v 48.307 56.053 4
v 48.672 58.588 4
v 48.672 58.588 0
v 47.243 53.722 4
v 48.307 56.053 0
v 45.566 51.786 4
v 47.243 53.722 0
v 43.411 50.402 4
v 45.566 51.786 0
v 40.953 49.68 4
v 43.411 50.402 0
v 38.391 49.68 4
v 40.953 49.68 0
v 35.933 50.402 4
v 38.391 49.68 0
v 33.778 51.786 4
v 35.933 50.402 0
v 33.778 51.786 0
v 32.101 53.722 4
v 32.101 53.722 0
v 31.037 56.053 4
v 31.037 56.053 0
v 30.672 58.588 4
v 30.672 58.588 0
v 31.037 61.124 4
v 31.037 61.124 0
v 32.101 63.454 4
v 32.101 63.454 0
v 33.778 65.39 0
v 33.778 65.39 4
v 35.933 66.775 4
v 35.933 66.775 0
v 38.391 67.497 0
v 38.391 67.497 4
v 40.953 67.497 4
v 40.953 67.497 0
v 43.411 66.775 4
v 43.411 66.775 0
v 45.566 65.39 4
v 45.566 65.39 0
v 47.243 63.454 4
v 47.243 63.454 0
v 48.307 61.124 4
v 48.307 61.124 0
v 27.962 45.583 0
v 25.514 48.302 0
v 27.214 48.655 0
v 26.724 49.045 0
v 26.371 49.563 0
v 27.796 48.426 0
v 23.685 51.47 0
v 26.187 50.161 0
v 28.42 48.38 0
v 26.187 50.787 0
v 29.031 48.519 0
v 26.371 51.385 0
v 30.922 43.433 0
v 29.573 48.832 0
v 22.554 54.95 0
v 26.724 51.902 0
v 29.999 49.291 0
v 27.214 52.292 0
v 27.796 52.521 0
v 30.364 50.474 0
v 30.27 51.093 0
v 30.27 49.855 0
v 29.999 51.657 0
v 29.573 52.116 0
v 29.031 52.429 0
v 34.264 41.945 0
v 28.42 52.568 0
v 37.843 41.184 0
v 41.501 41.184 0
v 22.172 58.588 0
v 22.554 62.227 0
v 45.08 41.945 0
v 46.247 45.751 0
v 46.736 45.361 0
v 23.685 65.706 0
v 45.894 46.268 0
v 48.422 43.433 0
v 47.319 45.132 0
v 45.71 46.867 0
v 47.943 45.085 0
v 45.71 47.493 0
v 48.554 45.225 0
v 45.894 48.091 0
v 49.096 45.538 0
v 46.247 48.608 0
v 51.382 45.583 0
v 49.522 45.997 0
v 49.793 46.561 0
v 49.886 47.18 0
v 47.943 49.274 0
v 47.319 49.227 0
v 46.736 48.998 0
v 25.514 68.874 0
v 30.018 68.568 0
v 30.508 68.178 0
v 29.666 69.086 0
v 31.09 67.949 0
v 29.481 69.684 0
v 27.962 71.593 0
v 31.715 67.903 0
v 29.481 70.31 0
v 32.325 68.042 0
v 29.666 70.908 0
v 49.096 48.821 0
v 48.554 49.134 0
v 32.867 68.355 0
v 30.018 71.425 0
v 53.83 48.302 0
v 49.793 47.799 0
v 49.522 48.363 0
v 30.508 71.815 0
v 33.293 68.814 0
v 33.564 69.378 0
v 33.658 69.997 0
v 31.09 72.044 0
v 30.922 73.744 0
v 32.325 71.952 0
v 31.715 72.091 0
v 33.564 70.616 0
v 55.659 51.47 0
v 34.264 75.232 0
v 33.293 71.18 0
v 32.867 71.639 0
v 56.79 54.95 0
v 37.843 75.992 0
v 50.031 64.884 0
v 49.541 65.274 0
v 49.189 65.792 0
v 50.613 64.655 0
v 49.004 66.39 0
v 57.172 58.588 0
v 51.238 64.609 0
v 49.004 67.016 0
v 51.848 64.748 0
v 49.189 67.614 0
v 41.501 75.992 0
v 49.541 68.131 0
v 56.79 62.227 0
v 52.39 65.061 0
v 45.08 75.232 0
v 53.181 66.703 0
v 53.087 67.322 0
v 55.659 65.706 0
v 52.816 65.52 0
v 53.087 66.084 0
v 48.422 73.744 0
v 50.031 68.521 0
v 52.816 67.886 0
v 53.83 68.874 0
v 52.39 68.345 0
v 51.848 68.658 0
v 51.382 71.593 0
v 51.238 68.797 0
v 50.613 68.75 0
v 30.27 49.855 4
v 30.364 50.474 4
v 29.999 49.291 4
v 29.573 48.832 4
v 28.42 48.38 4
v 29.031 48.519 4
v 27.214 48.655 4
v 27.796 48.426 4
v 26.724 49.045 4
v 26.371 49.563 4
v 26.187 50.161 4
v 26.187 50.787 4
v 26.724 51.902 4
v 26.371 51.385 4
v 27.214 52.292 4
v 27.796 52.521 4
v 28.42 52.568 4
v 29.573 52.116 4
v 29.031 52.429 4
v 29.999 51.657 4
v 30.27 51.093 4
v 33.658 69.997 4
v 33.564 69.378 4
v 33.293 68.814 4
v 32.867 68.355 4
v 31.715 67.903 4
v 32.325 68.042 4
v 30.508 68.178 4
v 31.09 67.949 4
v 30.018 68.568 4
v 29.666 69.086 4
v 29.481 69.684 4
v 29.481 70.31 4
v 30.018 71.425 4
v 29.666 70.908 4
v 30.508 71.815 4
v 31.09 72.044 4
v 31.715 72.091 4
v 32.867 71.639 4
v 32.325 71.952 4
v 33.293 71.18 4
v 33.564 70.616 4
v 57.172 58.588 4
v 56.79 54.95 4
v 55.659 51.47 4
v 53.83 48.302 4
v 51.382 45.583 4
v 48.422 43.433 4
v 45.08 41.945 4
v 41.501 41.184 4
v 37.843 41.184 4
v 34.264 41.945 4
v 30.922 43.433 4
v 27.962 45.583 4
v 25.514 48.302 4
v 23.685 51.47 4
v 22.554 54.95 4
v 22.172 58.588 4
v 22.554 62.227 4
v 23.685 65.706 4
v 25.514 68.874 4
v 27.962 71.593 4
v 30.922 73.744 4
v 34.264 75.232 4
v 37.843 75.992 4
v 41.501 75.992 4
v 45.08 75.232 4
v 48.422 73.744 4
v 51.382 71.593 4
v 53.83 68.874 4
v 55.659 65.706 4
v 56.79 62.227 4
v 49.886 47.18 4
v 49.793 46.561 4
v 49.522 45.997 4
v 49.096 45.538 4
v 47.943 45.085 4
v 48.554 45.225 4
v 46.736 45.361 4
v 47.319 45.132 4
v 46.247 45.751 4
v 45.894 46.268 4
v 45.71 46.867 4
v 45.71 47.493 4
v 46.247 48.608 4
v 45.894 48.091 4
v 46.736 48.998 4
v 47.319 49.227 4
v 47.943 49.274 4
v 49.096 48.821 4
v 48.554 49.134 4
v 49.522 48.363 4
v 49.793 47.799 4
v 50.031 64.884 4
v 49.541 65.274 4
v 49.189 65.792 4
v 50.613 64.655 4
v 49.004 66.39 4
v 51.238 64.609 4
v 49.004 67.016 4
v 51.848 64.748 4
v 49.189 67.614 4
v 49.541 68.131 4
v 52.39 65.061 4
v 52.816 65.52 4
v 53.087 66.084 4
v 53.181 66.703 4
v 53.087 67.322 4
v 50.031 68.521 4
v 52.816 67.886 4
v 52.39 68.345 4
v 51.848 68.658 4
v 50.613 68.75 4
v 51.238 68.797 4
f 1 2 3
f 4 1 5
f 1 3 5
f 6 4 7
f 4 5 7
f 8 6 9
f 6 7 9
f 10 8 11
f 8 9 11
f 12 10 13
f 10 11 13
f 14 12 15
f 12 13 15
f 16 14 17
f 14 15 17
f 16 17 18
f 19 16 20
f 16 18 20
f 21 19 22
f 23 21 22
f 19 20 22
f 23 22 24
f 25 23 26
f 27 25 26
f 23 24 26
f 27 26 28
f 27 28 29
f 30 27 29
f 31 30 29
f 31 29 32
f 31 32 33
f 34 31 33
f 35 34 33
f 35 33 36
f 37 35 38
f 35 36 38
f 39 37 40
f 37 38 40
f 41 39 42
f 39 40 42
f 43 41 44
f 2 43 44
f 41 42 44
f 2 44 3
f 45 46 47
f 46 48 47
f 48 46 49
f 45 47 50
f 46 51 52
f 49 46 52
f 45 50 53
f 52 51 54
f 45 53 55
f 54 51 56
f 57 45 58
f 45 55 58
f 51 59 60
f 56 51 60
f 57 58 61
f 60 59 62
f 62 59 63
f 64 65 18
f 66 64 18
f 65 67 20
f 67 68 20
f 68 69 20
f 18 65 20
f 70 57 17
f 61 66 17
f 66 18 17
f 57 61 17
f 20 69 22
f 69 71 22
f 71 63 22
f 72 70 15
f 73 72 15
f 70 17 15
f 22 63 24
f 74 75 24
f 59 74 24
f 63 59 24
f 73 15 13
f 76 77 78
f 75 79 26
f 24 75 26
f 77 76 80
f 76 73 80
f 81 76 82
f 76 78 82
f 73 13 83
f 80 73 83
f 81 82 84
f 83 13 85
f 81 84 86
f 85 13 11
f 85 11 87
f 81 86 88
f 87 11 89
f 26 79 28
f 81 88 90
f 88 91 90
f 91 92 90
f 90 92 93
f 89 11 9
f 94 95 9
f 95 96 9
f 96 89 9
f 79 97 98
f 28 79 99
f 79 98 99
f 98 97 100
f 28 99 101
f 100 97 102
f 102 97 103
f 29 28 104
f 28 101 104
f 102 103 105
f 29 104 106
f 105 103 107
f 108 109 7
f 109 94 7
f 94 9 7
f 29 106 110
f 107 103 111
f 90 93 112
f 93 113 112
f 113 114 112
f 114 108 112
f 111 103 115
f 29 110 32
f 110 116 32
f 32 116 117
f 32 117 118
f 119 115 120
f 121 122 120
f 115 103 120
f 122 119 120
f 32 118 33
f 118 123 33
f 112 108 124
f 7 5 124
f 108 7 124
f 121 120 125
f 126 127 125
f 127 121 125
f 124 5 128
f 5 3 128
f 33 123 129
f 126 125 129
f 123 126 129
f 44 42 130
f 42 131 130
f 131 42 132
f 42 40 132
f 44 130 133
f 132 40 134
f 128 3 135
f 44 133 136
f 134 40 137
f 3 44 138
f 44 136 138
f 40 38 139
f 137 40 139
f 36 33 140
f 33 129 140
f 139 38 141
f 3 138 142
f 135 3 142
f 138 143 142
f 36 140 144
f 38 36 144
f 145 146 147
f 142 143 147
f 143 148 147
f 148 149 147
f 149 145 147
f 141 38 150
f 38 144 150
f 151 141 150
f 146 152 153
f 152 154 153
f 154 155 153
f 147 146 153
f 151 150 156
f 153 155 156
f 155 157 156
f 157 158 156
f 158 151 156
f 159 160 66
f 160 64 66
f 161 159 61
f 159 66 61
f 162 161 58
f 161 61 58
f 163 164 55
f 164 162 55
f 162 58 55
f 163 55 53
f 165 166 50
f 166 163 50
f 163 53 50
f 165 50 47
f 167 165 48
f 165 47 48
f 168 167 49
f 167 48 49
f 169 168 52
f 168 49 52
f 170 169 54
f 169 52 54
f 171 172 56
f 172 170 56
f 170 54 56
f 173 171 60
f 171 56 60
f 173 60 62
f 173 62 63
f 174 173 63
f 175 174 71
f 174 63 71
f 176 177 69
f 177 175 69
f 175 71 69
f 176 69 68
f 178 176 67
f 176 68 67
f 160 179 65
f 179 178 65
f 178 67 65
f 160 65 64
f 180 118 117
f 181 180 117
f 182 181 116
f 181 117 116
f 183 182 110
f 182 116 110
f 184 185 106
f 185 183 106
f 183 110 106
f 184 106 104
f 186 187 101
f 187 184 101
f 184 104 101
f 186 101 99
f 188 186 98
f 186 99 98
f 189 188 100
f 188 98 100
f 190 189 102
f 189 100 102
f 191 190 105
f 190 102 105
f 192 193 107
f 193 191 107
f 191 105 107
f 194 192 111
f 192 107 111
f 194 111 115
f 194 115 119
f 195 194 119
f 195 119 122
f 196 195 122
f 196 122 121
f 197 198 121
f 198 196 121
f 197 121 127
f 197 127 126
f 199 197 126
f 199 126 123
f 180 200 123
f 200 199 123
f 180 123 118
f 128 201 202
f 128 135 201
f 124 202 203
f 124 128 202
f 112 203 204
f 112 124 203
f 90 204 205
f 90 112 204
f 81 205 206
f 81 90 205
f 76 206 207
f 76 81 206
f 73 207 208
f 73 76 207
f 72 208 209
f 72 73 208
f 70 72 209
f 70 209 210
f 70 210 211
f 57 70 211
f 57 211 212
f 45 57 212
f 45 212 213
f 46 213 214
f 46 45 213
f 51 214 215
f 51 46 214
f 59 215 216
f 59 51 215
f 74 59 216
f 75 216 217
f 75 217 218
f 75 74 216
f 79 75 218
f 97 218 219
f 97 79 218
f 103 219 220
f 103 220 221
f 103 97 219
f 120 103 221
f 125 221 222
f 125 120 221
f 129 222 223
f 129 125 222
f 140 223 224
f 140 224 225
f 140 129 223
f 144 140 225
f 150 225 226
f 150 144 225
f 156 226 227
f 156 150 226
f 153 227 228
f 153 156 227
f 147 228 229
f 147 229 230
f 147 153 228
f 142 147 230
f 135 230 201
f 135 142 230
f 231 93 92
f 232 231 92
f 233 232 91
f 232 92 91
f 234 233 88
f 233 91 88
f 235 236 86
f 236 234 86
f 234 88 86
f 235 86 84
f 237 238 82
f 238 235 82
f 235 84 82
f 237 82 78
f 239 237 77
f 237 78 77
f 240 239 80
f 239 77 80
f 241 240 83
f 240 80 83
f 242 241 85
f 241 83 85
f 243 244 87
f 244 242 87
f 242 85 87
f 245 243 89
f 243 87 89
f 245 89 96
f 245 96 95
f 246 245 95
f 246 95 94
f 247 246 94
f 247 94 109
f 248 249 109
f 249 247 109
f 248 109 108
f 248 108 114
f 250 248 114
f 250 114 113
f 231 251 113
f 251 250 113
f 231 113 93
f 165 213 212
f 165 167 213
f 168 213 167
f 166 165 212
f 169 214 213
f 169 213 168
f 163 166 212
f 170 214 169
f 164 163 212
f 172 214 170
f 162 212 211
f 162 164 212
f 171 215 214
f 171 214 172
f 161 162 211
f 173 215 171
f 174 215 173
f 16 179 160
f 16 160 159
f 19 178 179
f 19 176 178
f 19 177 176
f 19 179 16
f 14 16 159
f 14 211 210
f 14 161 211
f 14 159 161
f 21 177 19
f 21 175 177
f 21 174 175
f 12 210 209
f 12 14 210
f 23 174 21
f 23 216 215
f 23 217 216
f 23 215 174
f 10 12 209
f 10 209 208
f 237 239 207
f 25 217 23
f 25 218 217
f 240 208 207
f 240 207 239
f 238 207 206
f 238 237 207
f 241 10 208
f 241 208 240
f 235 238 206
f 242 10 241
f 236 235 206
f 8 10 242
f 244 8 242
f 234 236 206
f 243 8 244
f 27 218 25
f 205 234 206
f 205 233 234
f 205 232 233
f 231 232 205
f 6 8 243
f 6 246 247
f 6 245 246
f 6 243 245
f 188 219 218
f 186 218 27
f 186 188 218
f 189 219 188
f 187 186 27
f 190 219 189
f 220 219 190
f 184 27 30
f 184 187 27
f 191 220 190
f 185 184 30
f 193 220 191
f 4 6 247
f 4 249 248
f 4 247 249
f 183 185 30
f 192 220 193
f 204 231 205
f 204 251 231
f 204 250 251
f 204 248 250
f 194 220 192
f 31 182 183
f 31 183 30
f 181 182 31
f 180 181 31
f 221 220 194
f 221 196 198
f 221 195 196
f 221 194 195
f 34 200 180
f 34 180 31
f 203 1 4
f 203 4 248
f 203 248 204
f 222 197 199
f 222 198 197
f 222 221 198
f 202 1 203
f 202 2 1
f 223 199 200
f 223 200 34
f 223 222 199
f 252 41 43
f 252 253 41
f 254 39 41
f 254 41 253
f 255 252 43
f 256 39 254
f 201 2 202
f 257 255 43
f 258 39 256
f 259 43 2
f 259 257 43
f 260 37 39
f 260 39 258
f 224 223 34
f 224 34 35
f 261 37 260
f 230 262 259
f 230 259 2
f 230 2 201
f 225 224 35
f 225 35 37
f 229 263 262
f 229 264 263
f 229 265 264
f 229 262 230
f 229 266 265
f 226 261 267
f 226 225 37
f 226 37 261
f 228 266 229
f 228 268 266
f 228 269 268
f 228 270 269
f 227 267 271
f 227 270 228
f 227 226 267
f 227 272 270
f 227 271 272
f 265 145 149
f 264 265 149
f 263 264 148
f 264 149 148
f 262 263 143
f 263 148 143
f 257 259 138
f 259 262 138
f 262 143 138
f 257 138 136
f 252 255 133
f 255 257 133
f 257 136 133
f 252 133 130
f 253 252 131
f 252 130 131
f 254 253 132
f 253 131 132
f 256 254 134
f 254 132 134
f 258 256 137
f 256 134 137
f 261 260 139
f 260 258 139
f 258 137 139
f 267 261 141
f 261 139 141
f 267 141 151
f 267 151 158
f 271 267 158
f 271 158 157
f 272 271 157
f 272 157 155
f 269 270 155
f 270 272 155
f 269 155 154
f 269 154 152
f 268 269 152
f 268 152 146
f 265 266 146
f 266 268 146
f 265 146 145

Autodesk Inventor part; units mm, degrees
ref_plane "YZ Plane" through (0, 0, 0) normal (1, 0, 0) x (0, 1, 0)
ref_plane "XZ Plane" through (0, 0, 0) normal (0, 1, 0) x (-1, 0, 0)
ref_plane "XY Plane" through (0, 0, 0) normal (0, 0, 1) x (1, 0, 0)
sketch "スケッチ1" plane through (0, 0, 0) normal (0, 0, 1) x (1, 0, 0)
  circle A0 centre (-11.4931, -19.1593) radius 14 construction
  circle A1 centre (16.245, -15.3385) radius 14 construction
  line L0 (-170.915, -81.4118) -> (490.0044, -81.4118)
  line L1 (-197.2268, -33.1593) -> (179.6604, -33.1593) construction
  line L2 (-178.6504, 68.5882) -> (447.0756, 68.5882) construction
  circle A2 centre (-11.4931, -19.1593) radius 14 construction
  circle A3 centre (-21.8854, 6.8407) radius 14 construction
  circle A4 centre (-0.5211, 0.3031) radius 20.05 construction
  circle A5 centre (-0.5211, 0.3031) radius 22.3421 construction
  circle A6 centre (0, 0) radius 22.3421 construction
  circle A7 centre (-0.5211, 0.3031) radius 5.05 construction
  circle A8 centre (19.689, 29.6103) radius 30.55 construction
  circle A9 centre (19.689, 29.6103) radius 10.1 construction
  circle A10 centre (39.672, 58.5882) radius 25.1 construction
  line L3 (-0.5211, 0.3031) -> (39.672, 58.5882) construction
  circle A11 centre (19.689, 29.6103) radius 31.55 construction
  circle A12 centre (19.689, 29.6103) radius 12.1 construction
  circle A13 centre (-0.5211, 0.3031) radius 20.55 construction
  circle A14 centre (-0.5211, 0.3031) radius 6.05 construction
  circle A15 centre (36.8436, 61.4166) radius 4 construction
  circle A16 centre (36.8436, 61.4166) radius 2
  line L4 (36.8436, 61.4166) -> (39.672, 58.5882)
  line L5 (39.672, 58.5882) -> (22.909, 61.4166) construction
  circle A17 centre (22.909, 61.4166) radius 2
  circle A18 centre (22.909, 61.4166) radius 5
  line L6 (28.2635, 50.4737) -> (31.5576, 69.9968) construction
  line L7 (31.5576, 69.9968) -> (51.0806, 66.7027) construction
  line L8 (51.0806, 66.7027) -> (47.7865, 47.1796) construction
  line L9 (47.7865, 47.1796) -> (28.2635, 50.4737) construction
  circle A19 centre (39.672, 58.5882) radius 9
  circle A20 centre (28.2635, 50.4737) radius 2.5
  circle A21 centre (47.7865, 47.1796) radius 2.5
  circle A22 centre (51.0806, 66.7027) radius 2.5
  circle A23 centre (31.5576, 69.9968) radius 2.5
  circle A24 centre (28.2635, 50.4737) radius 5
  line L10 (22.909, 61.4166) -> (36.8436, 61.4166) construction
  line L11 (-26.0808, 51.4166) -> (-426.0808, 51.4166)
  line L12 (-26.0808, 24.4166) -> (23.9192, 24.4166)
  circle A25 centre (39.672, 58.5882) radius 17.5
  circle A26 centre (47.7865, 47.1796) radius 2.1
  circle A27 centre (28.2635, 50.4737) radius 2.1
  circle A28 centre (31.5576, 69.9968) radius 2.1
  circle A29 centre (51.0806, 66.7027) radius 2.1
  circle A30 centre (47.7865, 47.1796) radius 5
  circle A31 centre (31.5576, 69.9968) radius 5
  circle A32 centre (51.0806, 66.7027) radius 5
  circle A33 centre (39.672, 58.5882) radius 19.5
  circle A34 centre (39.672, 58.5882) radius 20.5
  line L13 (20.7504, 89.6882) -> (53.4998, 89.6882)
  line L14 (53.4998, 89.6882) -> (73.6516, 68.9857)
  line L15 (20.7504, 89.6882) -> (-13.977, 39.0272)
  circle A35 centre (-59.2702, 32.0272) radius 5.025 construction
  circle A36 centre (-59.2702, 32.0272) radius 4
  arc A37 (-59.2702, 39.0272) -> (-62.5897, 25.8643) centre (-59.2702, 32.0272) ccw
  line L16 (-59.2702, 39.0272) -> (-13.977, 39.0272)
  line L17 (-62.5897, 25.8643) -> (-36.5547, 11.8407)
  line L18 (-36.5547, 11.8407) -> (-36.5547, -33.1593)
  arc A38 (74.5655, 64.0796) -> (73.6516, 68.9857) centre (70.4271, 65.8469) ccw
  circle A39 centre (8.5193, 63.8863) radius 4.5 construction
  arc A40 (59.4085, 28.8085) -> (59.8353, 29.5856) centre (55.6969, 31.3528) ccw
  circle A41 centre (23.6647, -6.2198) radius 4.5
  circle A42 centre (-16.0241, 34.5272) radius 4.5 construction
  line L19 (59.8353, 29.5856) -> (74.5655, 64.0796)
  line L20 (32.172, 89.6882) -> (32.172, 92.6882)
  line L21 (32.172, 92.6882) -> (47.172, 92.6882)
  line L22 (47.172, 92.6882) -> (47.172, 89.6882)
  line L23 (35.172, 89.6882) -> (35.172, 86.6882)
  line L24 (35.172, 86.6882) -> (44.172, 86.6882)
  line L25 (44.172, 86.6882) -> (44.172, 89.6882)
  circle A43 centre (70.4271, 65.8469) radius 1.5
  circle A44 centre (55.6969, 31.3528) radius 1.5
  circle A45 centre (23.6647, -6.2198) radius 1.5
  circle A46 centre (-16.0241, 34.5272) radius 1.5
  circle A47 centre (8.5193, 63.8863) radius 1.5
  circle A48 centre (-10.0662, 20.4166) radius 4 construction
  circle A49 centre (-10.0662, 20.4166) radius 2
  line L26 (1.9305, -36.1593) -> (16.9305, -36.1593)
  line L27 (16.9305, -36.1593) -> (16.9305, -33.1593)
  line L28 (1.9305, -33.1593) -> (1.9305, -36.1593)
  arc A50 (1.9305, -33.1593) -> (-0.1695, -33.1593) centre (0.8805, -33.1593) ccw
  line L29 (13.9305, -30.1593) -> (13.9305, -33.1593)
  arc A51 (13.9305, -30.1593) -> (11.8305, -30.1593) centre (12.8805, -30.1593) ccw
  line L30 (7.0305, -30.1593) -> (11.8305, -30.1593)
  arc A52 (7.0305, -30.1593) -> (4.9305, -30.1593) centre (5.9805, -30.1593) ccw
  line L31 (4.9305, -33.1593) -> (4.9305, -30.1593)
  arc A53 (4.9305, -33.1593) -> (7.0305, -33.1593) centre (5.9805, -33.1593) ccw
  arc A54 (11.8305, -33.1593) -> (13.9305, -33.1593) centre (12.8805, -33.1593) ccw
  line L32 (-36.5547, -36.1593) -> (-21.5547, -36.1593)
  line L33 (-21.5547, -36.1593) -> (-21.5547, -33.1593)
  arc A55 (-19.4547, -33.1593) -> (-21.5547, -33.1593) centre (-20.5047, -33.1593) ccw
  line L34 (-36.5547, -33.1593) -> (-36.5547, -36.1593)
  arc A56 (-33.5547, -33.1593) -> (-31.4547, -33.1593) centre (-32.5047, -33.1593) ccw
  line L35 (-33.5547, -33.1593) -> (-33.5547, -30.1593)
  arc A57 (-31.4547, -30.1593) -> (-33.5547, -30.1593) centre (-32.5047, -30.1593) ccw
  line L36 (-31.4547, -30.1593) -> (-26.6547, -30.1593)
  arc A58 (-24.5547, -30.1593) -> (-26.6547, -30.1593) centre (-25.6047, -30.1593) ccw
  line L37 (-24.5547, -30.1593) -> (-24.5547, -33.1593)
  arc A59 (-26.6547, -33.1593) -> (-24.5547, -33.1593) centre (-25.6047, -33.1593) ccw
  line L38 (59.4085, 28.8085) -> (16.9305, -33.1593)
  circle A60 centre (-21.8854, 6.8407) radius 5
  circle A61 centre (-11.4931, -19.1593) radius 5
  line L39 (-31.4547, -33.1593) -> (-26.6547, -33.1593)
  line L40 (-19.4547, -33.1593) -> (-0.1695, -33.1593)
  line L41 (7.0305, -33.1593) -> (11.8305, -33.1593)
  line L42 (0.4485, -25.8914) -> (-27.1419, -10.3373) construction
  line L43 (-27.1419, -10.3373) -> (-17.3768, 21.5744) construction
  circle A62 centre (-21.8854, 6.8407) radius 8
  circle A63 centre (-11.4931, -19.1593) radius 8
  circle A64 centre (-19.5445, 14.4905) radius 1.3
  circle A65 centre (-24.2262, -0.8092) radius 1.3
  circle A66 centre (-18.4619, -15.2306) radius 1.3
  circle A67 centre (-4.5242, -23.088) radius 1.3
  circle A68 centre (-0.5211, 0.3031) radius 4.5
  circle A69 centre (19.689, 29.6103) radius 6
  arc A70 (87.3323, 12.0445) -> (87.1264, 18.8999) centre (85.1711, 15.4104) ccw
  line L44 (16.9305, -33.1593) -> (87.3323, 12.0445)
  line L45 (87.1264, 18.8999) -> (61.4227, 33.3027)
  circle A71 centre (85.1711, 15.4104) radius 2
  dimension "d0" = 150
  dimension "d1" = 28
  dimension "d2" = 28
  dimension "d3" = 40.1
  dimension "d4" = 10.1
  dimension "d5" = 61.1
  dimension "d6" = 20.2
  dimension "d7" = 50.2
  dimension "d8" = 10
  dimension "d9" = 2
  dimension "d10" = 1
  dimension "d11" = 2
  dimension "d12" = 0.5
  dimension "d13" = 1
  dimension "d14" = 40
  dimension "d15" = 8
  dimension "d16" = 4
  dimension "d17" = 4
  dimension "d18" = 45
  dimension "d19" = 17
  dimension "d20" = 4
  dimension "d21" = 3
  dimension "d22" = 1
  dimension "d23" = 5
  dimension "d24" = 5
  dimension "d25" = 5
  dimension "d26" = 5
  dimension "d27" = 10
  dimension "d28" = 400
  dimension "d29" = 10
  dimension "d30" = 50
  dimension "d31" = 50
  dimension "d32" = 27
  dimension "d33" = 27
  dimension "d34" = 35
  dimension "d35" = 4.2
  dimension "d36" = 4.2
  dimension "d37" = 4.2
  dimension "d38" = 4.2
  dimension "d39" = 10
  dimension "d40" = 10
  dimension "d41" = 10
  dimension "d42" = 2
  dimension "d43" = 1
  dimension "d44" = 8
  dimension "d45" = 3
  dimension "d46" = 4
  dimension "d47" = 9
  dimension "d48" = 9
  dimension "d49" = 9
  dimension "d50" = 9
  dimension "d51" = 9
  dimension "d52" = 3
  dimension "d53" = 15
  dimension "d54" = 3
  dimension "d55" = 9
  dimension "d56" = 3
  dimension "d57" = 7.5
  dimension "d58" = 3
  dimension "d59" = 3
  dimension "d60" = 3
  dimension "d61" = 3
  dimension "d62" = 3
  dimension "d63" = 8
extrude "押し出し1" add sketch "スケッチ1" along normal blind 4 contours A17 A25 | A17 A25 A18 | A25 A31 A19 A24 A18 | A25 A31 | A24 A25 | A25 A32 A19 A31 | A19 A30 A25 A24 | A25 A32 | A32 A25 A30 A19 | A30 A25 | A20 | A21 | A22 | A23 picked at (23.2356, 61.3111) picked at (31.8427, 73.6117) picked at (27.4228, 46.9526) picked at (51.9213, 70.2238) picked at (47.5014, 43.5647)
properties part number "横回転首振り最終段カム" material "アルミニウム 7075"
